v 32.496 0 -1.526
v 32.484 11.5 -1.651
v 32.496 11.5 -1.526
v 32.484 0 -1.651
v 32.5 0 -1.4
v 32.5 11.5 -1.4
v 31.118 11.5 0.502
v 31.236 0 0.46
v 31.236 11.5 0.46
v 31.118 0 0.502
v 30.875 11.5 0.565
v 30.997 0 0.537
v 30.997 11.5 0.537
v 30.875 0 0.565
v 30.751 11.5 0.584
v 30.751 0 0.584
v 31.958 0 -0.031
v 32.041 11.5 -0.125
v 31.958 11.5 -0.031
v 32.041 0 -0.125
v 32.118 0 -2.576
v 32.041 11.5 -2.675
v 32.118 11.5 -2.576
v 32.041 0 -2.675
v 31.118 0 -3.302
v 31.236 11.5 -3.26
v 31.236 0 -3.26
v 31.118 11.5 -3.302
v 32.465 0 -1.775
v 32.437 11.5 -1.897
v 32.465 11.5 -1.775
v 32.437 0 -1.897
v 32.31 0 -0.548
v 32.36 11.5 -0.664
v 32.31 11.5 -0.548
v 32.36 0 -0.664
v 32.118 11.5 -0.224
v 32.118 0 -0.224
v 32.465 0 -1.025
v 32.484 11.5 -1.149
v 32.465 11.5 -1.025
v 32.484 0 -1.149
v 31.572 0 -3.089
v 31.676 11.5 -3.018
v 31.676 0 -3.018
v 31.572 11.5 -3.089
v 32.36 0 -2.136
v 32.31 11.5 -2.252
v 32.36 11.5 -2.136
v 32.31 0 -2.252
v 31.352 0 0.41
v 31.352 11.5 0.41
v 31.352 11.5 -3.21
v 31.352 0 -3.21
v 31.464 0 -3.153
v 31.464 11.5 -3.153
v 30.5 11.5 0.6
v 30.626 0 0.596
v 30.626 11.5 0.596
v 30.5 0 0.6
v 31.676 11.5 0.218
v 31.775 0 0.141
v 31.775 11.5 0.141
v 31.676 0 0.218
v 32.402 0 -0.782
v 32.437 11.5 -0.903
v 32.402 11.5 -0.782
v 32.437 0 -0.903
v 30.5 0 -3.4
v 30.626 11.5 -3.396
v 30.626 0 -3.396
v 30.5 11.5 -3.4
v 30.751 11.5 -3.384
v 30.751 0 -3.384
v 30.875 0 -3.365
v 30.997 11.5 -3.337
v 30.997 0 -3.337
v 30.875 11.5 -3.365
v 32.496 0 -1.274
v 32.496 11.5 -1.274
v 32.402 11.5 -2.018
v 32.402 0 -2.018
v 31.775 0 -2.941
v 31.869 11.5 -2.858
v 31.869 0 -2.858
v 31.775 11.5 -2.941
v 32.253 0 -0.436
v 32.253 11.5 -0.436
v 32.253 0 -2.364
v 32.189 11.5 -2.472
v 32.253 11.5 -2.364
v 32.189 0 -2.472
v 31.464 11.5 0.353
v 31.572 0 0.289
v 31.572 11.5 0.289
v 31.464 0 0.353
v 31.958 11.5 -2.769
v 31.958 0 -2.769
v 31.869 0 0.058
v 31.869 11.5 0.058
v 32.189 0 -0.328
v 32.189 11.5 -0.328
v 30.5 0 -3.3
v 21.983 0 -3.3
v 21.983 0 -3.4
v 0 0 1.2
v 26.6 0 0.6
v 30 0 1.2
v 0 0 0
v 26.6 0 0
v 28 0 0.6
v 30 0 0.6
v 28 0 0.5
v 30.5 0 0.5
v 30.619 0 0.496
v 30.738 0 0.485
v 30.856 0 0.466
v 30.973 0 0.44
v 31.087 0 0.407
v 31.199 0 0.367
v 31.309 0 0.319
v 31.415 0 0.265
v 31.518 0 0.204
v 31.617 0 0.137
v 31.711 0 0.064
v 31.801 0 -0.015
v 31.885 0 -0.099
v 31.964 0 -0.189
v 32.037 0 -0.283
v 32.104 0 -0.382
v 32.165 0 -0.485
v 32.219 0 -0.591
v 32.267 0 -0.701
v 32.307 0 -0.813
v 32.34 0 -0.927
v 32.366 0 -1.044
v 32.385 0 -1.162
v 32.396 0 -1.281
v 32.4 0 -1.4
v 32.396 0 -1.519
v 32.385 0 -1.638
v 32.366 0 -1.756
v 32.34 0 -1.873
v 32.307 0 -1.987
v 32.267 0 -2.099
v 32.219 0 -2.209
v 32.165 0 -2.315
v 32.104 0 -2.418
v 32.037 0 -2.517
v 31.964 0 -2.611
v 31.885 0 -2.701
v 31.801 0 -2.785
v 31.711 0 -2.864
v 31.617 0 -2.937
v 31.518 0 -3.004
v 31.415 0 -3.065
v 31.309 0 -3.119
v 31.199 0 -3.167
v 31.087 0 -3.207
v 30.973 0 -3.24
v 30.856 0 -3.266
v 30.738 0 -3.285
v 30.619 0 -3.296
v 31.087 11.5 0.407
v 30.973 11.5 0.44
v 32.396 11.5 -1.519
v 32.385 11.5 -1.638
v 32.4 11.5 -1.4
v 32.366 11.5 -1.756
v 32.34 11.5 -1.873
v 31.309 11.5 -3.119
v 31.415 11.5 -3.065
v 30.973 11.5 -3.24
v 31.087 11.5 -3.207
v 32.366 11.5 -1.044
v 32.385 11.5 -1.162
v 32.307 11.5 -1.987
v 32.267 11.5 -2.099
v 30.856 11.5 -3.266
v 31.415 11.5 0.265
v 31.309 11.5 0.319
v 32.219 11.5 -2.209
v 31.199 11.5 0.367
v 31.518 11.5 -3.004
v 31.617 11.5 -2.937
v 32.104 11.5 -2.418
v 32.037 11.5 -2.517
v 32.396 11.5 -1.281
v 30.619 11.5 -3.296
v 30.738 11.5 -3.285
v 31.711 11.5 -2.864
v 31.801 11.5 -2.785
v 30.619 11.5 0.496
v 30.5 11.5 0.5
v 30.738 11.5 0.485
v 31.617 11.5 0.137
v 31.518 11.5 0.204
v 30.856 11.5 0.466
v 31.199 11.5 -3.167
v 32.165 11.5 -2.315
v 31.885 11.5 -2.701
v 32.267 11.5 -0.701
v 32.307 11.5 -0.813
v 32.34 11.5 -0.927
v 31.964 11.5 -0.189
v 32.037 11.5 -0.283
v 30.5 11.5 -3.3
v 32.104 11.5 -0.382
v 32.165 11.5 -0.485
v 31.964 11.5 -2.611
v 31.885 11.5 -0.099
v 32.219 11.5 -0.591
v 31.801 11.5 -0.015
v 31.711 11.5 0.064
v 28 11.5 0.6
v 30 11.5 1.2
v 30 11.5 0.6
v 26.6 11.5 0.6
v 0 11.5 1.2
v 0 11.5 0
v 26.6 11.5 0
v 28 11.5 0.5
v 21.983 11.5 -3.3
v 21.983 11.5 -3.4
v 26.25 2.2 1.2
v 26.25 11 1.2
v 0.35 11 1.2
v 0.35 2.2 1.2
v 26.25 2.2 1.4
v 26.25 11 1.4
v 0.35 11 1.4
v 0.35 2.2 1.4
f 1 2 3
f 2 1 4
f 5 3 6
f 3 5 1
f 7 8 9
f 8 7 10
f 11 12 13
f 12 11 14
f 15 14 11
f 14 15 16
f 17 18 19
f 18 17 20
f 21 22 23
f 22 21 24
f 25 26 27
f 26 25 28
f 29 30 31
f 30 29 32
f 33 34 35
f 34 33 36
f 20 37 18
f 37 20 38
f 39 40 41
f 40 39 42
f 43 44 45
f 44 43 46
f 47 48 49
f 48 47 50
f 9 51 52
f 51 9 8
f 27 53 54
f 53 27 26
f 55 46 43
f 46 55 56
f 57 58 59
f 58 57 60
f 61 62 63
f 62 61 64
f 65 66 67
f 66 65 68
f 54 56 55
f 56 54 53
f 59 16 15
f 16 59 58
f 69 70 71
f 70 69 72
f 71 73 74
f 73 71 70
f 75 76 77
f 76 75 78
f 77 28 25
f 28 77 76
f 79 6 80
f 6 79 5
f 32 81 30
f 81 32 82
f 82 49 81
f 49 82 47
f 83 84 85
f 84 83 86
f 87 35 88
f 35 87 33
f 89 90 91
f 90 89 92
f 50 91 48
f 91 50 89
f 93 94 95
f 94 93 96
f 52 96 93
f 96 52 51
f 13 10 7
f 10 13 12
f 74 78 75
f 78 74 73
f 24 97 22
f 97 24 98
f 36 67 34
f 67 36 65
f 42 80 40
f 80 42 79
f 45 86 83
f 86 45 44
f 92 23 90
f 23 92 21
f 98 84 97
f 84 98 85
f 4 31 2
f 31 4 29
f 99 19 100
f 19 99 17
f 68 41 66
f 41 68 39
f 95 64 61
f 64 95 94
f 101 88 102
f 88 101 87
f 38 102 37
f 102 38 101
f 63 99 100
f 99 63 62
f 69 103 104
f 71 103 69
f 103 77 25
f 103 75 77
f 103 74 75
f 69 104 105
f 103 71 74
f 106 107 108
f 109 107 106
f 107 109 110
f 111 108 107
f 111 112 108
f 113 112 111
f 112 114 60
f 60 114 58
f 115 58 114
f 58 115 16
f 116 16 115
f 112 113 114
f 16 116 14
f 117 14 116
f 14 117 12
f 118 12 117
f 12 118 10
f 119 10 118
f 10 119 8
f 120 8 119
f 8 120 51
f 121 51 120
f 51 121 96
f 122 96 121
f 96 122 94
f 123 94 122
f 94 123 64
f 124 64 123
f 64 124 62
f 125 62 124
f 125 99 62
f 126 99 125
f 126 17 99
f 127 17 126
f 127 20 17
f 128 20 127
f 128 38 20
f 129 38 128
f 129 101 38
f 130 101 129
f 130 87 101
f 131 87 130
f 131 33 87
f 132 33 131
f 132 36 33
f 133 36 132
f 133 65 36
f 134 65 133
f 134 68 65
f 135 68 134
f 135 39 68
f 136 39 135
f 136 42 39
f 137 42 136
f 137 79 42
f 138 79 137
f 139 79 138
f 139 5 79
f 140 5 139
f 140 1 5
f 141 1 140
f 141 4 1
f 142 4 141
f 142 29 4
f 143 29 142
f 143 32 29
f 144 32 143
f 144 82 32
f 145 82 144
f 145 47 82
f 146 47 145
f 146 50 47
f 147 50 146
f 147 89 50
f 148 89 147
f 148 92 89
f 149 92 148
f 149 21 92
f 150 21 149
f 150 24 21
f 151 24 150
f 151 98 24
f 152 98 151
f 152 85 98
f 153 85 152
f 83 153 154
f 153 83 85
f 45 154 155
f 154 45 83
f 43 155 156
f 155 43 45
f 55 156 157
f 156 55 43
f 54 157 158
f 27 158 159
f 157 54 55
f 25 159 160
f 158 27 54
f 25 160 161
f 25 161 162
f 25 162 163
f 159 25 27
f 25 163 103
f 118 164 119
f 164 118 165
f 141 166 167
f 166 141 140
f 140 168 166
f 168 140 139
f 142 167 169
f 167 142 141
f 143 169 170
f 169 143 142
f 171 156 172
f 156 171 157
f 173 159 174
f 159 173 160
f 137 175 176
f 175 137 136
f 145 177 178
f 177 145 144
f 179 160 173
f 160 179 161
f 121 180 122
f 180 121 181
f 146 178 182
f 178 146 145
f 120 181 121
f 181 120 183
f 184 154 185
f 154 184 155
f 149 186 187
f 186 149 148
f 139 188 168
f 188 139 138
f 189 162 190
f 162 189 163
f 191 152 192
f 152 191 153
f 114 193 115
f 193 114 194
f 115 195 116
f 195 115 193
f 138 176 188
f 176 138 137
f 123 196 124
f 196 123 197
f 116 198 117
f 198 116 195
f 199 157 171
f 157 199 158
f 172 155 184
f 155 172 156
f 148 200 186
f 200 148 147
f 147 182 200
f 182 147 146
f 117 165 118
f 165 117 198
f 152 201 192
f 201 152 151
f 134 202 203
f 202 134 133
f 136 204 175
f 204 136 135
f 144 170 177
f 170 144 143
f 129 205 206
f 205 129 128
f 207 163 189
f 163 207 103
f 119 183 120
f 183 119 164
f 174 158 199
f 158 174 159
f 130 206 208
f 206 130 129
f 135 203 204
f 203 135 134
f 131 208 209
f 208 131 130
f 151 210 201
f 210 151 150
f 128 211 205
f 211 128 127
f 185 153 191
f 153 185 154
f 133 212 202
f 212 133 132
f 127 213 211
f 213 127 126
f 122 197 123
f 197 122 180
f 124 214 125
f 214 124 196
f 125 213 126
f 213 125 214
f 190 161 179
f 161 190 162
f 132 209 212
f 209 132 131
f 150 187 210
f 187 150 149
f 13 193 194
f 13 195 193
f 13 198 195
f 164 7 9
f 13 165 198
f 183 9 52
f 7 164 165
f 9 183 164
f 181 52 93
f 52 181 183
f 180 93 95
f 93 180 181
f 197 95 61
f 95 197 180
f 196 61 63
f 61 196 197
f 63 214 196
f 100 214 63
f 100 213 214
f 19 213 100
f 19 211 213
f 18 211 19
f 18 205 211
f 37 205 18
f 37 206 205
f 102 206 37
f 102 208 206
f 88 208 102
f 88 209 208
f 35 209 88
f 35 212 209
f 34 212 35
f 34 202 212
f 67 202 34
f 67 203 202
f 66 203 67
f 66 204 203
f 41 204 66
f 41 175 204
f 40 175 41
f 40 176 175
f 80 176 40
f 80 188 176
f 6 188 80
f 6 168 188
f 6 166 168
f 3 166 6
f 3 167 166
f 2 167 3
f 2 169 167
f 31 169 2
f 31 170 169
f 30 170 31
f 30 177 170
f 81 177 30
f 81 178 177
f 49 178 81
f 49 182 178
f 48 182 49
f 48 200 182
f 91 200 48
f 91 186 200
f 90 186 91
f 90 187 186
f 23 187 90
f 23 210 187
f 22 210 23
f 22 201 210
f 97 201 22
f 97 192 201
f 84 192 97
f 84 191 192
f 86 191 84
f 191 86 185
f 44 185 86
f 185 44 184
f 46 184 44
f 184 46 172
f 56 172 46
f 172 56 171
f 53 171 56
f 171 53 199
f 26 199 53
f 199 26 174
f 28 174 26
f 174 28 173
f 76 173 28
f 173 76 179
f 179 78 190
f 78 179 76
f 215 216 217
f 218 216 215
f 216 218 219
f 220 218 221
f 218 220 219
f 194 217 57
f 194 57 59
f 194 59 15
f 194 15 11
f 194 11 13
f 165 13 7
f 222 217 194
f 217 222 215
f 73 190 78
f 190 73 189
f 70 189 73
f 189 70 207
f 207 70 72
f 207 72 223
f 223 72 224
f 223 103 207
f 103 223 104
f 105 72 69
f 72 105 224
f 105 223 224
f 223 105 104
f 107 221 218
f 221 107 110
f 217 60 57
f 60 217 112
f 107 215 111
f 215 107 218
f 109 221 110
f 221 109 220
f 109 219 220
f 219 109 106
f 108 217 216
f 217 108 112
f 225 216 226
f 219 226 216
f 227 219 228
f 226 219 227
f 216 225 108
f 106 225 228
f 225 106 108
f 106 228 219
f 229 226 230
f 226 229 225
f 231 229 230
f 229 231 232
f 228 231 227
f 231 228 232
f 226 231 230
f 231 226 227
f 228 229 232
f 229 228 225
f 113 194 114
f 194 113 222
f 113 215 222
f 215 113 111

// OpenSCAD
//Stackup
capThick=0.6;
panelThick=0.6;
polarThick=0.2;

//dimensions of cap (bottom glass)
capLeft=0;
capWidth=26.6;
capTop=0;
capHeight=11.5;
capBot=capHeight-capHeight-capTop;

//Dimensions of panel (top glass)
panelLeft=0;
panelTop=0;
panelWidth=30.0;
panelHeight=11.5;
panelBot=capHeight-panelHeight-panelTop;

//Dimensions of polarizer
polarWidth=25.9;
polarLeft=0.35;
polarHeight=8.8;
polarTop=0.5;
polarBot=capHeight-polarHeight-polarTop;



translate([capLeft,capBot,0])
  color("#e0e0e0")
    cube([capWidth,capHeight,capThick]);

translate([panelLeft,panelBot,capThick])
  color(c=[0.9,0.9,0.9],alpha=0.1)
    cube([panelWidth,panelHeight,panelThick]);

translate([polarLeft,polarBot,capThick+panelThick])
  color("#202020")
    cube([polarWidth,polarHeight,polarThick]);
    
//tape
tapeRad=2;
tapeWidth=15.3+2;
tapeHeight=panelHeight;
tapeLeft=panelWidth-2;
tapeThick=0.1;
tapeBot=0;
tapeCylCirc=PI*tapeRad;
tapeWidth1=2.5;
tapeWidth2=tapeWidth-tapeCylCirc-tapeWidth1;


translate([tapeLeft,tapeBot,capThick-tapeThick])
  color("#808020",alpha=0.5)
    cube([tapeWidth1,tapeHeight,tapeThick]);

color("#c08000",alpha=0.6) {
translate([tapeLeft+tapeWidth1,tapeBot,-tapeRad+capThick])
rotate([-90,0,0])
intersection() {
    difference() {
      cylinder(h=tapeWidth,r=tapeRad,$fn=100);
      translate([0,0,-0.1])
      cylinder(h=tapeWidth+0.2,r=tapeRad-tapeThick,$fn=100);
    }
    translate([0,-tapeRad,0])
    cube([tapeRad,tapeRad*2,tapeHeight]);
}

translate([tapeLeft+tapeWidth1-tapeWidth2,0,capThick-tapeRad*2])
cube([tapeWidth2,tapeHeight,tapeThick]);
}
